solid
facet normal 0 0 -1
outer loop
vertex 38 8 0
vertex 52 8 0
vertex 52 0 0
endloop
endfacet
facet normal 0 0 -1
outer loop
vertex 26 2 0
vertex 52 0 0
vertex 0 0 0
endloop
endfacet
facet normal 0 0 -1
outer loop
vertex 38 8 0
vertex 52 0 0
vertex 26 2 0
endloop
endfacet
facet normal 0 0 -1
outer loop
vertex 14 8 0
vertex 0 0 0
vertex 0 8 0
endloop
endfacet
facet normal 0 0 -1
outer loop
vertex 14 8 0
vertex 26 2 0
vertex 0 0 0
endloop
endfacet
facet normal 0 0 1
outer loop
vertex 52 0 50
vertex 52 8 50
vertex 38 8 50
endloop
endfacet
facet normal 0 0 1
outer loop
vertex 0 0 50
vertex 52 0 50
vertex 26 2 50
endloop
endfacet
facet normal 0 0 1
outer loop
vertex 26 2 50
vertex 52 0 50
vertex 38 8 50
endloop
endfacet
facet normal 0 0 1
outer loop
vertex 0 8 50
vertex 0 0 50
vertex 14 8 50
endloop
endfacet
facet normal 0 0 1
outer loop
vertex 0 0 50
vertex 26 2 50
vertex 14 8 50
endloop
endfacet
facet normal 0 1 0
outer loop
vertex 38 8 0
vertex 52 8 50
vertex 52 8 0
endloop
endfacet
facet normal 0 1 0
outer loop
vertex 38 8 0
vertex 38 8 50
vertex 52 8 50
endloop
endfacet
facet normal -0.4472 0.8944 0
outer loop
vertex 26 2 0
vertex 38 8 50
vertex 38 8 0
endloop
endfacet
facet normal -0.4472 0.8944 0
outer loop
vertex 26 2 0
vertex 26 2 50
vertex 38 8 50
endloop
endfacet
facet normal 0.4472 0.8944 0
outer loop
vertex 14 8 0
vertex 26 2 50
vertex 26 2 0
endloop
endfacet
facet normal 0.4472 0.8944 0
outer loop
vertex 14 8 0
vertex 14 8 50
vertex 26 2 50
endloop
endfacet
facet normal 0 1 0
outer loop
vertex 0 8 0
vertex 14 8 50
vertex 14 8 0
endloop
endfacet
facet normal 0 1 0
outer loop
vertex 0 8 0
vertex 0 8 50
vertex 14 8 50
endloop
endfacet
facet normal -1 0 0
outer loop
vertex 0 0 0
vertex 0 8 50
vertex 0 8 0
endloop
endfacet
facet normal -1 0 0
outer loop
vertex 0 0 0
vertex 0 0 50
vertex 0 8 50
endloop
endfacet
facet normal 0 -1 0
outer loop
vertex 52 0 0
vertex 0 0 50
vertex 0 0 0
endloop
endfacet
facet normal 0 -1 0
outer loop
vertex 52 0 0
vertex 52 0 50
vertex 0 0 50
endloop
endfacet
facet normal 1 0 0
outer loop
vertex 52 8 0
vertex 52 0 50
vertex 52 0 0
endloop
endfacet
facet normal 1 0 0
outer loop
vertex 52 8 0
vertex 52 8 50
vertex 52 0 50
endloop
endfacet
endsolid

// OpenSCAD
$fn = 32;

// ----------------------------------------------------------------------
// V guide rail: vway, 52 mm wide
// ----------------------------------------------------------------------

// --- parameters (mm) ---
rail_w = 52;              // rail width, X
base_t = 8;               // base plate thickness
v_depth = 6;              // V feature depth / height
v_half_w = 12;            // half width of the V at the base face
plate_t = 50;             // rail length, Z (the extrusion height)

profile = [[0, 0], [52, 0], [52, 8], [38, 8], [26, 2], [14, 8], [0, 8]];  // primary outline, 7 points, counter clockwise

// --- the one profile operation ---
linear_extrude(height = plate_t) polygon(points = profile);
